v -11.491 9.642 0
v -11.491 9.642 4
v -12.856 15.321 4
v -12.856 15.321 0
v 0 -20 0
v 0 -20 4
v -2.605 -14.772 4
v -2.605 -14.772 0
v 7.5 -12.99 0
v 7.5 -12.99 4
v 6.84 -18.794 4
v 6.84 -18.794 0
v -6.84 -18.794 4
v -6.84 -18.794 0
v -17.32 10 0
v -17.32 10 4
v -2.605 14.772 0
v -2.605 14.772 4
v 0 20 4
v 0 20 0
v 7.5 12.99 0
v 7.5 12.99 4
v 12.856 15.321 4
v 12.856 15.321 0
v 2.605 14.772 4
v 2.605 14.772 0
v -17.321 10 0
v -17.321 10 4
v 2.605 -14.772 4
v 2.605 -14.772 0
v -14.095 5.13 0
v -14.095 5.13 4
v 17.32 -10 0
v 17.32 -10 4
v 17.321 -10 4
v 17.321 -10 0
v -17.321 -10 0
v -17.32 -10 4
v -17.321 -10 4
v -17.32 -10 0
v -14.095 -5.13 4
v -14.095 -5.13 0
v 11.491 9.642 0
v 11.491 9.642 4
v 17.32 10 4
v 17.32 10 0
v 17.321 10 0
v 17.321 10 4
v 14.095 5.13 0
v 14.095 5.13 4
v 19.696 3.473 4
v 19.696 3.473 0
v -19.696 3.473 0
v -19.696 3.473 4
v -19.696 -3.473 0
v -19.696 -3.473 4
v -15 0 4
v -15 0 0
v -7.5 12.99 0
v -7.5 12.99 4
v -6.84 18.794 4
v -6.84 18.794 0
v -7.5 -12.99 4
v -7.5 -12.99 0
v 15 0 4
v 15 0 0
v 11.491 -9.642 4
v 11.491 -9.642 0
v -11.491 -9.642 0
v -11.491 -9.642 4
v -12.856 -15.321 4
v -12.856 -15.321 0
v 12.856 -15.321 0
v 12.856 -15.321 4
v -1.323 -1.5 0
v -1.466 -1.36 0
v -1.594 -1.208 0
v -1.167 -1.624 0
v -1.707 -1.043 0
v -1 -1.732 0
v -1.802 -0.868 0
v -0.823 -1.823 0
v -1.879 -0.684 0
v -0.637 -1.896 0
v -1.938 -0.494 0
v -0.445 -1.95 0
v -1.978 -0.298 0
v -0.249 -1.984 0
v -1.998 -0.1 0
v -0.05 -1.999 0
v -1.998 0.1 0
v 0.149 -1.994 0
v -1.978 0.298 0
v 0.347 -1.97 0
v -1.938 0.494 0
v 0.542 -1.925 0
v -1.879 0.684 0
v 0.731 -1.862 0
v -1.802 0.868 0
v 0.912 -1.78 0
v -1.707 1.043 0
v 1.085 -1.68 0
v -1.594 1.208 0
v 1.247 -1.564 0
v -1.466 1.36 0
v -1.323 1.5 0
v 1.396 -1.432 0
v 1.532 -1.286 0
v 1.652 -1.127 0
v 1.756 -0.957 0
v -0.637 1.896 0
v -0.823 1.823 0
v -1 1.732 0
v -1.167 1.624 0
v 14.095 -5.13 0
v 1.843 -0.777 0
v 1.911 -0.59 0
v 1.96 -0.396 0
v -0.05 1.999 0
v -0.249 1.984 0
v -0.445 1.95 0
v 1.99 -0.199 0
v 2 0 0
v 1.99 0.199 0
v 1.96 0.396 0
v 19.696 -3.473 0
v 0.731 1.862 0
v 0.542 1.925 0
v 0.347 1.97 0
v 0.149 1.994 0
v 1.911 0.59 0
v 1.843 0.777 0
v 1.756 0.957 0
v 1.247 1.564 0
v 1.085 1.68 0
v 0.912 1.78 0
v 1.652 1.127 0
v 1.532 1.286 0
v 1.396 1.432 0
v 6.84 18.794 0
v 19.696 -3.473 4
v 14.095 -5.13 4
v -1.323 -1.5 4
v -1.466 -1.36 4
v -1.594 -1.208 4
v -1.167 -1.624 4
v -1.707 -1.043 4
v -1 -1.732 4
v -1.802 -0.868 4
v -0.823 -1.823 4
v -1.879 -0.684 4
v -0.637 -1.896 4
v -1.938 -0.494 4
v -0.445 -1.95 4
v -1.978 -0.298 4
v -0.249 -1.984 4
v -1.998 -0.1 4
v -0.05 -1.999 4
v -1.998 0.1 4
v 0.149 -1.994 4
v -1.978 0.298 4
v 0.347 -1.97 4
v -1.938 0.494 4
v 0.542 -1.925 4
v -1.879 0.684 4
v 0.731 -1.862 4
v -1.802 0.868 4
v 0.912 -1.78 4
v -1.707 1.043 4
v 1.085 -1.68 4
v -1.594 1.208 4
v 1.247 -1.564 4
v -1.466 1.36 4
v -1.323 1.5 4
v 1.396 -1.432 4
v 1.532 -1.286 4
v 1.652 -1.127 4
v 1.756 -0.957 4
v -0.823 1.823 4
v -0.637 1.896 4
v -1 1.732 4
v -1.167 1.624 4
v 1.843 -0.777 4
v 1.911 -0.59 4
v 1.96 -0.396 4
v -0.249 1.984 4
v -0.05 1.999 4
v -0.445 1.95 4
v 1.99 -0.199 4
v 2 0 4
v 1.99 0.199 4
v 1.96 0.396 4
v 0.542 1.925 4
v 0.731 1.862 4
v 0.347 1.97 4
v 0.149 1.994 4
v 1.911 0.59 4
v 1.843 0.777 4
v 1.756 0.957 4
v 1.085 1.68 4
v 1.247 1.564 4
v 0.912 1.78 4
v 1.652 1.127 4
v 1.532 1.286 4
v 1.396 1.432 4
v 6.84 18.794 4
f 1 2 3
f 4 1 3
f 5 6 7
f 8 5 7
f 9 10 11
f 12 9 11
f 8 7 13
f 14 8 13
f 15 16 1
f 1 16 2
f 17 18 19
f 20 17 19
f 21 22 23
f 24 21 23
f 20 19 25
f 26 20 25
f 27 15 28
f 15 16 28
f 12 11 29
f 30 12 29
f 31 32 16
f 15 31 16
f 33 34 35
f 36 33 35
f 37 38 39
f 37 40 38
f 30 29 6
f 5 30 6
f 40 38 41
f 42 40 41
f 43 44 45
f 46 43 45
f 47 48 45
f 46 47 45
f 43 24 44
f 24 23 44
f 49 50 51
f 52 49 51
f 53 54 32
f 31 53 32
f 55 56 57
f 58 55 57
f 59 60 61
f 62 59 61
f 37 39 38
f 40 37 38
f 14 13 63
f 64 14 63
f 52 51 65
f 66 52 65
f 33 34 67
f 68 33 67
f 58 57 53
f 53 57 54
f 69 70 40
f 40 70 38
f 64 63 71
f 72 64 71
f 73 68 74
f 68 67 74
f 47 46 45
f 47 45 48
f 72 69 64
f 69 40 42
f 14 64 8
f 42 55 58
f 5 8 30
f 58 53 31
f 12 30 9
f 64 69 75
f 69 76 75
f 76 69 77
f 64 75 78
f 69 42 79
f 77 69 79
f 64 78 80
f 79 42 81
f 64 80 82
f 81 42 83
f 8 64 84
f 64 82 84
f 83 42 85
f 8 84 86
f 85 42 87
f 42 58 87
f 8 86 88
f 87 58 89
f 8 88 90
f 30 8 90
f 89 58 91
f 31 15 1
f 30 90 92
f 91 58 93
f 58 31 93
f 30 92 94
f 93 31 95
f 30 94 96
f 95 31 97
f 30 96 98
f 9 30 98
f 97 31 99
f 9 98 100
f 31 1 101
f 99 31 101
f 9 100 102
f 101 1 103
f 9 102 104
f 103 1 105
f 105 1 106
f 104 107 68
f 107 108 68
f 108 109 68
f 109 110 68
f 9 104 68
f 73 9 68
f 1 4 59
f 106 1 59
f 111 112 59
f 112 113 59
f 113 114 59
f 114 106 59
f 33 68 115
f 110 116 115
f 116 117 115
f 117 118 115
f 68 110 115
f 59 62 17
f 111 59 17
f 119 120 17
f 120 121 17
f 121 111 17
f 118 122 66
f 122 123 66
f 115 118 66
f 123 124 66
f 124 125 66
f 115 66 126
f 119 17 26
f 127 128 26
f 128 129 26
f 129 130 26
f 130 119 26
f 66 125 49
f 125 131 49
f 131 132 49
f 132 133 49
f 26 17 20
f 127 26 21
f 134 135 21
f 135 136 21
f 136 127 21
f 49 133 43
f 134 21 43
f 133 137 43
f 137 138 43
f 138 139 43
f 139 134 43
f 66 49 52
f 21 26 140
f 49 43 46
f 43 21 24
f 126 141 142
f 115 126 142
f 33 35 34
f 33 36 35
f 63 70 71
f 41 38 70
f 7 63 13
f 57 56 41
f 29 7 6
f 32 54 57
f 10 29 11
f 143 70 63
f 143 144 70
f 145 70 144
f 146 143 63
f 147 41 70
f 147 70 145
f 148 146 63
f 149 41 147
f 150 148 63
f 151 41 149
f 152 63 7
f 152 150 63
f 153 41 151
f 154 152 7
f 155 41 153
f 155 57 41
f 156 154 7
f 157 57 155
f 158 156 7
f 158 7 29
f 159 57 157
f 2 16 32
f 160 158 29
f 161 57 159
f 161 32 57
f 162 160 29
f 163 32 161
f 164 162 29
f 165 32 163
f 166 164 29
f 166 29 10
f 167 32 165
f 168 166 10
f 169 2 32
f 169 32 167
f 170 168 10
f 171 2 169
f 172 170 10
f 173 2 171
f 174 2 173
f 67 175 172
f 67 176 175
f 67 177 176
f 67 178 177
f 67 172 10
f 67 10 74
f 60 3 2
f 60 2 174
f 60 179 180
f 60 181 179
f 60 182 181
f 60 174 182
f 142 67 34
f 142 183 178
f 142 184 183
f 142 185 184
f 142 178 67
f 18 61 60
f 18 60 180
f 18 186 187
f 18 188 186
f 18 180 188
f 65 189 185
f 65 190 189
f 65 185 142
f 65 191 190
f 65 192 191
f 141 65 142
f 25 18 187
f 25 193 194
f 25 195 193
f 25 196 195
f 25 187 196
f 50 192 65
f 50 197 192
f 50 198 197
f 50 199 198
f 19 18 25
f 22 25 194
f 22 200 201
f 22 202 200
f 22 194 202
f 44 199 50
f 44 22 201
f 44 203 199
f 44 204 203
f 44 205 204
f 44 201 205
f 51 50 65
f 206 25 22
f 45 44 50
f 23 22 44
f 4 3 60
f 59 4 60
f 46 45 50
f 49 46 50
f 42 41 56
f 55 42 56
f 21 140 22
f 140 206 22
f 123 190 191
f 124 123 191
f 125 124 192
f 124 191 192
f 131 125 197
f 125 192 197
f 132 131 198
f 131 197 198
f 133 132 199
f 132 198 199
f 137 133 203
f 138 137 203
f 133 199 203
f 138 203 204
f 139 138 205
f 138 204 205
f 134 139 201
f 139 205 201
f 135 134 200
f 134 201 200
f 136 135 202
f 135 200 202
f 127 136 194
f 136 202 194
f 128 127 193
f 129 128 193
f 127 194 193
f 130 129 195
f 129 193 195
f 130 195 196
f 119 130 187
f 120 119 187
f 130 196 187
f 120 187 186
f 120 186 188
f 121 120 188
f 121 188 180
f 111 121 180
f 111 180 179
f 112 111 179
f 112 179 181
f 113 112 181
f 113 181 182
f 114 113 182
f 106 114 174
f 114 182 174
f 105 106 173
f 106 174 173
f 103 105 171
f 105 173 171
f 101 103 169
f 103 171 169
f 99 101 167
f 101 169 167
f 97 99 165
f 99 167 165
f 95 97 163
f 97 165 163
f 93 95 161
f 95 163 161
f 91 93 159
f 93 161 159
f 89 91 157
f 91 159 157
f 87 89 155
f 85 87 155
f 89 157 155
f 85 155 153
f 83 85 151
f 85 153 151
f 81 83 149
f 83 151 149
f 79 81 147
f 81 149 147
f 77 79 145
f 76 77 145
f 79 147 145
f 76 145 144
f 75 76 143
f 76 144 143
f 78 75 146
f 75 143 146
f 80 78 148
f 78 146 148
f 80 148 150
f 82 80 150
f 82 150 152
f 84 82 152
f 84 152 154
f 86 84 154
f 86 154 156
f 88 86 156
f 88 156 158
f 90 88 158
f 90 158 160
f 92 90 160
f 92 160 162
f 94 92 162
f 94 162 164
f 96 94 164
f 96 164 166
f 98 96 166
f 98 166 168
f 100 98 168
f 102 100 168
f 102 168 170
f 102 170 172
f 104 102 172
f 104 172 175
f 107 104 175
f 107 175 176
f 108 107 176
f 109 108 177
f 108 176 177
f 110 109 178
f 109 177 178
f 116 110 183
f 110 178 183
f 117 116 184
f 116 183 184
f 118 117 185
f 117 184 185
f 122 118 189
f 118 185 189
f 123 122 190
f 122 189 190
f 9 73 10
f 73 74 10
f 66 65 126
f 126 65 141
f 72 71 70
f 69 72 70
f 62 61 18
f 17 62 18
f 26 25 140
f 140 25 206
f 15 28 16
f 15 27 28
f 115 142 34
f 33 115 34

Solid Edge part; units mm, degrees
sketch "Sketch1" plane through (0, 0, 0) normal (0, 0, 1) x (1, 0, 0)
  circle A0 centre (0, 0) radius 20
extrude "Protrusion1" add sketch "Sketch1" along normal blind 4
sketch "Sketch2" plane through (0, 0, 4) normal (0, 0, 1) x (1, 0, 0)
  circle A0 centre (0, 0) radius 2
extrude "ExtrudedCutout_1" cut sketch "Sketch2" against normal blind 4
sketch "Sketch3" plane through (0, 0, 4) normal (0, 0, 1) x (0, 1, 0)
  line L0 (3.473, 19.6962) -> (5.1303, 14.0954)
  line L1 (5.1303, 14.0954) -> (10, 17.3205)
  line L2 (10, 17.3205) -> (7.6149, 20.9218)
  line L3 (7.6149, 20.9218) -> (3.473, 19.6962)
  line L4 (10, 17.3205) -> (9.6418, 11.4907)
  line L5 (9.6418, 11.4907) -> (15.3209, 12.8558)
  line L6 (15.3209, 12.8558) -> (14.3114, 17.0556)
  line L7 (14.3114, 17.0556) -> (10, 17.3205)
  line L8 (15.3209, 12.8558) -> (12.9904, 7.5)
  line L9 (12.9904, 7.5) -> (18.7939, 6.8404)
  line L10 (18.7939, 6.8404) -> (19.2816, 11.1323)
  line L11 (19.2816, 11.1323) -> (15.3209, 12.8558)
  line L12 (18.7939, 6.8404) -> (14.7721, 2.6047)
  line L13 (14.7721, 2.6047) -> (20, 0)
  line L14 (20, 0) -> (21.9263, 3.8662)
  line L15 (21.9263, 3.8662) -> (18.7939, 6.8404)
  line L16 (20, 0) -> (14.7721, -2.6047)
  line L17 (14.7721, -2.6047) -> (18.7939, -6.8404)
  line L18 (18.7939, -6.8404) -> (21.9263, -3.8662)
  line L19 (21.9263, -3.8662) -> (20, 0)
  line L20 (18.7939, -6.8404) -> (12.9904, -7.5)
  line L21 (12.9904, -7.5) -> (15.3209, -12.8558)
  line L22 (15.3209, -12.8558) -> (19.2816, -11.1323)
  line L23 (19.2816, -11.1323) -> (18.7939, -6.8404)
  line L24 (15.3209, -12.8558) -> (9.6418, -11.4907)
  line L25 (9.6418, -11.4907) -> (10, -17.3205)
  line L26 (10, -17.3205) -> (14.3114, -17.0556)
  line L27 (14.3114, -17.0556) -> (15.3209, -12.8558)
  line L28 (10, -17.3205) -> (5.1303, -14.0954)
  line L29 (5.1303, -14.0954) -> (3.473, -19.6962)
  line L30 (3.473, -19.6962) -> (7.6149, -20.9218)
  line L31 (7.6149, -20.9218) -> (10, -17.3205)
  line L32 (3.473, -19.6962) -> (0, -15)
  line L33 (0, -15) -> (-3.473, -19.6962)
  line L34 (-3.473, -19.6962) -> (0, -22.2645)
  line L35 (0, -22.2645) -> (3.473, -19.6962)
  line L36 (-3.473, -19.6962) -> (-5.1303, -14.0954)
  line L37 (-5.1303, -14.0954) -> (-10, -17.3205)
  line L38 (-10, -17.3205) -> (-7.6149, -20.9218)
  line L39 (-7.6149, -20.9218) -> (-3.473, -19.6962)
  line L40 (-10, -17.3205) -> (-9.6418, -11.4907)
  line L41 (-9.6418, -11.4907) -> (-15.3209, -12.8558)
  line L42 (-15.3209, -12.8558) -> (-14.3114, -17.0556)
  line L43 (-14.3114, -17.0556) -> (-10, -17.3205)
  line L44 (-15.3209, -12.8558) -> (-12.9904, -7.5)
  line L45 (-12.9904, -7.5) -> (-18.7939, -6.8404)
  line L46 (-18.7939, -6.8404) -> (-19.2816, -11.1323)
  line L47 (-19.2816, -11.1323) -> (-15.3209, -12.8558)
  line L48 (-18.7939, -6.8404) -> (-14.7721, -2.6047)
  line L49 (-14.7721, -2.6047) -> (-20, 0)
  line L50 (-20, 0) -> (-21.9263, -3.8662)
  line L51 (-21.9263, -3.8662) -> (-18.7939, -6.8404)
  line L52 (-20, 0) -> (-14.7721, 2.6047)
  line L53 (-14.7721, 2.6047) -> (-18.7939, 6.8404)
  line L54 (-18.7939, 6.8404) -> (-21.9263, 3.8662)
  line L55 (-21.9263, 3.8662) -> (-20, 0)
  line L56 (-18.7939, 6.8404) -> (-12.9904, 7.5)
  line L57 (-12.9904, 7.5) -> (-15.3209, 12.8558)
  line L58 (-15.3209, 12.8558) -> (-19.2816, 11.1323)
  line L59 (-19.2816, 11.1323) -> (-18.7939, 6.8404)
  line L60 (-10, 17.3205) -> (-5.1303, 14.0954)
  line L61 (-5.1303, 14.0954) -> (-3.473, 19.6962)
  line L62 (-3.473, 19.6962) -> (-7.6149, 20.9218)
  line L63 (-7.6149, 20.9218) -> (-10, 17.3205)
  line L64 (-15.3209, 12.8558) -> (-9.6418, 11.4907)
  line L65 (-9.6418, 11.4907) -> (-10, 17.3205)
  line L66 (-10, 17.3205) -> (-14.3114, 17.0556)
  line L67 (-14.3114, 17.0556) -> (-15.3209, 12.8558)
  line L68 (-3.473, 19.6962) -> (0, 15)
  line L69 (0, 15) -> (3.473, 19.6962)
  line L70 (3.473, 19.6962) -> (0, 22.2645)
  line L71 (0, 22.2645) -> (-3.473, 19.6962)
extrude "ExtrudedCutout_2" cut sketch "Sketch3" against normal blind 4
